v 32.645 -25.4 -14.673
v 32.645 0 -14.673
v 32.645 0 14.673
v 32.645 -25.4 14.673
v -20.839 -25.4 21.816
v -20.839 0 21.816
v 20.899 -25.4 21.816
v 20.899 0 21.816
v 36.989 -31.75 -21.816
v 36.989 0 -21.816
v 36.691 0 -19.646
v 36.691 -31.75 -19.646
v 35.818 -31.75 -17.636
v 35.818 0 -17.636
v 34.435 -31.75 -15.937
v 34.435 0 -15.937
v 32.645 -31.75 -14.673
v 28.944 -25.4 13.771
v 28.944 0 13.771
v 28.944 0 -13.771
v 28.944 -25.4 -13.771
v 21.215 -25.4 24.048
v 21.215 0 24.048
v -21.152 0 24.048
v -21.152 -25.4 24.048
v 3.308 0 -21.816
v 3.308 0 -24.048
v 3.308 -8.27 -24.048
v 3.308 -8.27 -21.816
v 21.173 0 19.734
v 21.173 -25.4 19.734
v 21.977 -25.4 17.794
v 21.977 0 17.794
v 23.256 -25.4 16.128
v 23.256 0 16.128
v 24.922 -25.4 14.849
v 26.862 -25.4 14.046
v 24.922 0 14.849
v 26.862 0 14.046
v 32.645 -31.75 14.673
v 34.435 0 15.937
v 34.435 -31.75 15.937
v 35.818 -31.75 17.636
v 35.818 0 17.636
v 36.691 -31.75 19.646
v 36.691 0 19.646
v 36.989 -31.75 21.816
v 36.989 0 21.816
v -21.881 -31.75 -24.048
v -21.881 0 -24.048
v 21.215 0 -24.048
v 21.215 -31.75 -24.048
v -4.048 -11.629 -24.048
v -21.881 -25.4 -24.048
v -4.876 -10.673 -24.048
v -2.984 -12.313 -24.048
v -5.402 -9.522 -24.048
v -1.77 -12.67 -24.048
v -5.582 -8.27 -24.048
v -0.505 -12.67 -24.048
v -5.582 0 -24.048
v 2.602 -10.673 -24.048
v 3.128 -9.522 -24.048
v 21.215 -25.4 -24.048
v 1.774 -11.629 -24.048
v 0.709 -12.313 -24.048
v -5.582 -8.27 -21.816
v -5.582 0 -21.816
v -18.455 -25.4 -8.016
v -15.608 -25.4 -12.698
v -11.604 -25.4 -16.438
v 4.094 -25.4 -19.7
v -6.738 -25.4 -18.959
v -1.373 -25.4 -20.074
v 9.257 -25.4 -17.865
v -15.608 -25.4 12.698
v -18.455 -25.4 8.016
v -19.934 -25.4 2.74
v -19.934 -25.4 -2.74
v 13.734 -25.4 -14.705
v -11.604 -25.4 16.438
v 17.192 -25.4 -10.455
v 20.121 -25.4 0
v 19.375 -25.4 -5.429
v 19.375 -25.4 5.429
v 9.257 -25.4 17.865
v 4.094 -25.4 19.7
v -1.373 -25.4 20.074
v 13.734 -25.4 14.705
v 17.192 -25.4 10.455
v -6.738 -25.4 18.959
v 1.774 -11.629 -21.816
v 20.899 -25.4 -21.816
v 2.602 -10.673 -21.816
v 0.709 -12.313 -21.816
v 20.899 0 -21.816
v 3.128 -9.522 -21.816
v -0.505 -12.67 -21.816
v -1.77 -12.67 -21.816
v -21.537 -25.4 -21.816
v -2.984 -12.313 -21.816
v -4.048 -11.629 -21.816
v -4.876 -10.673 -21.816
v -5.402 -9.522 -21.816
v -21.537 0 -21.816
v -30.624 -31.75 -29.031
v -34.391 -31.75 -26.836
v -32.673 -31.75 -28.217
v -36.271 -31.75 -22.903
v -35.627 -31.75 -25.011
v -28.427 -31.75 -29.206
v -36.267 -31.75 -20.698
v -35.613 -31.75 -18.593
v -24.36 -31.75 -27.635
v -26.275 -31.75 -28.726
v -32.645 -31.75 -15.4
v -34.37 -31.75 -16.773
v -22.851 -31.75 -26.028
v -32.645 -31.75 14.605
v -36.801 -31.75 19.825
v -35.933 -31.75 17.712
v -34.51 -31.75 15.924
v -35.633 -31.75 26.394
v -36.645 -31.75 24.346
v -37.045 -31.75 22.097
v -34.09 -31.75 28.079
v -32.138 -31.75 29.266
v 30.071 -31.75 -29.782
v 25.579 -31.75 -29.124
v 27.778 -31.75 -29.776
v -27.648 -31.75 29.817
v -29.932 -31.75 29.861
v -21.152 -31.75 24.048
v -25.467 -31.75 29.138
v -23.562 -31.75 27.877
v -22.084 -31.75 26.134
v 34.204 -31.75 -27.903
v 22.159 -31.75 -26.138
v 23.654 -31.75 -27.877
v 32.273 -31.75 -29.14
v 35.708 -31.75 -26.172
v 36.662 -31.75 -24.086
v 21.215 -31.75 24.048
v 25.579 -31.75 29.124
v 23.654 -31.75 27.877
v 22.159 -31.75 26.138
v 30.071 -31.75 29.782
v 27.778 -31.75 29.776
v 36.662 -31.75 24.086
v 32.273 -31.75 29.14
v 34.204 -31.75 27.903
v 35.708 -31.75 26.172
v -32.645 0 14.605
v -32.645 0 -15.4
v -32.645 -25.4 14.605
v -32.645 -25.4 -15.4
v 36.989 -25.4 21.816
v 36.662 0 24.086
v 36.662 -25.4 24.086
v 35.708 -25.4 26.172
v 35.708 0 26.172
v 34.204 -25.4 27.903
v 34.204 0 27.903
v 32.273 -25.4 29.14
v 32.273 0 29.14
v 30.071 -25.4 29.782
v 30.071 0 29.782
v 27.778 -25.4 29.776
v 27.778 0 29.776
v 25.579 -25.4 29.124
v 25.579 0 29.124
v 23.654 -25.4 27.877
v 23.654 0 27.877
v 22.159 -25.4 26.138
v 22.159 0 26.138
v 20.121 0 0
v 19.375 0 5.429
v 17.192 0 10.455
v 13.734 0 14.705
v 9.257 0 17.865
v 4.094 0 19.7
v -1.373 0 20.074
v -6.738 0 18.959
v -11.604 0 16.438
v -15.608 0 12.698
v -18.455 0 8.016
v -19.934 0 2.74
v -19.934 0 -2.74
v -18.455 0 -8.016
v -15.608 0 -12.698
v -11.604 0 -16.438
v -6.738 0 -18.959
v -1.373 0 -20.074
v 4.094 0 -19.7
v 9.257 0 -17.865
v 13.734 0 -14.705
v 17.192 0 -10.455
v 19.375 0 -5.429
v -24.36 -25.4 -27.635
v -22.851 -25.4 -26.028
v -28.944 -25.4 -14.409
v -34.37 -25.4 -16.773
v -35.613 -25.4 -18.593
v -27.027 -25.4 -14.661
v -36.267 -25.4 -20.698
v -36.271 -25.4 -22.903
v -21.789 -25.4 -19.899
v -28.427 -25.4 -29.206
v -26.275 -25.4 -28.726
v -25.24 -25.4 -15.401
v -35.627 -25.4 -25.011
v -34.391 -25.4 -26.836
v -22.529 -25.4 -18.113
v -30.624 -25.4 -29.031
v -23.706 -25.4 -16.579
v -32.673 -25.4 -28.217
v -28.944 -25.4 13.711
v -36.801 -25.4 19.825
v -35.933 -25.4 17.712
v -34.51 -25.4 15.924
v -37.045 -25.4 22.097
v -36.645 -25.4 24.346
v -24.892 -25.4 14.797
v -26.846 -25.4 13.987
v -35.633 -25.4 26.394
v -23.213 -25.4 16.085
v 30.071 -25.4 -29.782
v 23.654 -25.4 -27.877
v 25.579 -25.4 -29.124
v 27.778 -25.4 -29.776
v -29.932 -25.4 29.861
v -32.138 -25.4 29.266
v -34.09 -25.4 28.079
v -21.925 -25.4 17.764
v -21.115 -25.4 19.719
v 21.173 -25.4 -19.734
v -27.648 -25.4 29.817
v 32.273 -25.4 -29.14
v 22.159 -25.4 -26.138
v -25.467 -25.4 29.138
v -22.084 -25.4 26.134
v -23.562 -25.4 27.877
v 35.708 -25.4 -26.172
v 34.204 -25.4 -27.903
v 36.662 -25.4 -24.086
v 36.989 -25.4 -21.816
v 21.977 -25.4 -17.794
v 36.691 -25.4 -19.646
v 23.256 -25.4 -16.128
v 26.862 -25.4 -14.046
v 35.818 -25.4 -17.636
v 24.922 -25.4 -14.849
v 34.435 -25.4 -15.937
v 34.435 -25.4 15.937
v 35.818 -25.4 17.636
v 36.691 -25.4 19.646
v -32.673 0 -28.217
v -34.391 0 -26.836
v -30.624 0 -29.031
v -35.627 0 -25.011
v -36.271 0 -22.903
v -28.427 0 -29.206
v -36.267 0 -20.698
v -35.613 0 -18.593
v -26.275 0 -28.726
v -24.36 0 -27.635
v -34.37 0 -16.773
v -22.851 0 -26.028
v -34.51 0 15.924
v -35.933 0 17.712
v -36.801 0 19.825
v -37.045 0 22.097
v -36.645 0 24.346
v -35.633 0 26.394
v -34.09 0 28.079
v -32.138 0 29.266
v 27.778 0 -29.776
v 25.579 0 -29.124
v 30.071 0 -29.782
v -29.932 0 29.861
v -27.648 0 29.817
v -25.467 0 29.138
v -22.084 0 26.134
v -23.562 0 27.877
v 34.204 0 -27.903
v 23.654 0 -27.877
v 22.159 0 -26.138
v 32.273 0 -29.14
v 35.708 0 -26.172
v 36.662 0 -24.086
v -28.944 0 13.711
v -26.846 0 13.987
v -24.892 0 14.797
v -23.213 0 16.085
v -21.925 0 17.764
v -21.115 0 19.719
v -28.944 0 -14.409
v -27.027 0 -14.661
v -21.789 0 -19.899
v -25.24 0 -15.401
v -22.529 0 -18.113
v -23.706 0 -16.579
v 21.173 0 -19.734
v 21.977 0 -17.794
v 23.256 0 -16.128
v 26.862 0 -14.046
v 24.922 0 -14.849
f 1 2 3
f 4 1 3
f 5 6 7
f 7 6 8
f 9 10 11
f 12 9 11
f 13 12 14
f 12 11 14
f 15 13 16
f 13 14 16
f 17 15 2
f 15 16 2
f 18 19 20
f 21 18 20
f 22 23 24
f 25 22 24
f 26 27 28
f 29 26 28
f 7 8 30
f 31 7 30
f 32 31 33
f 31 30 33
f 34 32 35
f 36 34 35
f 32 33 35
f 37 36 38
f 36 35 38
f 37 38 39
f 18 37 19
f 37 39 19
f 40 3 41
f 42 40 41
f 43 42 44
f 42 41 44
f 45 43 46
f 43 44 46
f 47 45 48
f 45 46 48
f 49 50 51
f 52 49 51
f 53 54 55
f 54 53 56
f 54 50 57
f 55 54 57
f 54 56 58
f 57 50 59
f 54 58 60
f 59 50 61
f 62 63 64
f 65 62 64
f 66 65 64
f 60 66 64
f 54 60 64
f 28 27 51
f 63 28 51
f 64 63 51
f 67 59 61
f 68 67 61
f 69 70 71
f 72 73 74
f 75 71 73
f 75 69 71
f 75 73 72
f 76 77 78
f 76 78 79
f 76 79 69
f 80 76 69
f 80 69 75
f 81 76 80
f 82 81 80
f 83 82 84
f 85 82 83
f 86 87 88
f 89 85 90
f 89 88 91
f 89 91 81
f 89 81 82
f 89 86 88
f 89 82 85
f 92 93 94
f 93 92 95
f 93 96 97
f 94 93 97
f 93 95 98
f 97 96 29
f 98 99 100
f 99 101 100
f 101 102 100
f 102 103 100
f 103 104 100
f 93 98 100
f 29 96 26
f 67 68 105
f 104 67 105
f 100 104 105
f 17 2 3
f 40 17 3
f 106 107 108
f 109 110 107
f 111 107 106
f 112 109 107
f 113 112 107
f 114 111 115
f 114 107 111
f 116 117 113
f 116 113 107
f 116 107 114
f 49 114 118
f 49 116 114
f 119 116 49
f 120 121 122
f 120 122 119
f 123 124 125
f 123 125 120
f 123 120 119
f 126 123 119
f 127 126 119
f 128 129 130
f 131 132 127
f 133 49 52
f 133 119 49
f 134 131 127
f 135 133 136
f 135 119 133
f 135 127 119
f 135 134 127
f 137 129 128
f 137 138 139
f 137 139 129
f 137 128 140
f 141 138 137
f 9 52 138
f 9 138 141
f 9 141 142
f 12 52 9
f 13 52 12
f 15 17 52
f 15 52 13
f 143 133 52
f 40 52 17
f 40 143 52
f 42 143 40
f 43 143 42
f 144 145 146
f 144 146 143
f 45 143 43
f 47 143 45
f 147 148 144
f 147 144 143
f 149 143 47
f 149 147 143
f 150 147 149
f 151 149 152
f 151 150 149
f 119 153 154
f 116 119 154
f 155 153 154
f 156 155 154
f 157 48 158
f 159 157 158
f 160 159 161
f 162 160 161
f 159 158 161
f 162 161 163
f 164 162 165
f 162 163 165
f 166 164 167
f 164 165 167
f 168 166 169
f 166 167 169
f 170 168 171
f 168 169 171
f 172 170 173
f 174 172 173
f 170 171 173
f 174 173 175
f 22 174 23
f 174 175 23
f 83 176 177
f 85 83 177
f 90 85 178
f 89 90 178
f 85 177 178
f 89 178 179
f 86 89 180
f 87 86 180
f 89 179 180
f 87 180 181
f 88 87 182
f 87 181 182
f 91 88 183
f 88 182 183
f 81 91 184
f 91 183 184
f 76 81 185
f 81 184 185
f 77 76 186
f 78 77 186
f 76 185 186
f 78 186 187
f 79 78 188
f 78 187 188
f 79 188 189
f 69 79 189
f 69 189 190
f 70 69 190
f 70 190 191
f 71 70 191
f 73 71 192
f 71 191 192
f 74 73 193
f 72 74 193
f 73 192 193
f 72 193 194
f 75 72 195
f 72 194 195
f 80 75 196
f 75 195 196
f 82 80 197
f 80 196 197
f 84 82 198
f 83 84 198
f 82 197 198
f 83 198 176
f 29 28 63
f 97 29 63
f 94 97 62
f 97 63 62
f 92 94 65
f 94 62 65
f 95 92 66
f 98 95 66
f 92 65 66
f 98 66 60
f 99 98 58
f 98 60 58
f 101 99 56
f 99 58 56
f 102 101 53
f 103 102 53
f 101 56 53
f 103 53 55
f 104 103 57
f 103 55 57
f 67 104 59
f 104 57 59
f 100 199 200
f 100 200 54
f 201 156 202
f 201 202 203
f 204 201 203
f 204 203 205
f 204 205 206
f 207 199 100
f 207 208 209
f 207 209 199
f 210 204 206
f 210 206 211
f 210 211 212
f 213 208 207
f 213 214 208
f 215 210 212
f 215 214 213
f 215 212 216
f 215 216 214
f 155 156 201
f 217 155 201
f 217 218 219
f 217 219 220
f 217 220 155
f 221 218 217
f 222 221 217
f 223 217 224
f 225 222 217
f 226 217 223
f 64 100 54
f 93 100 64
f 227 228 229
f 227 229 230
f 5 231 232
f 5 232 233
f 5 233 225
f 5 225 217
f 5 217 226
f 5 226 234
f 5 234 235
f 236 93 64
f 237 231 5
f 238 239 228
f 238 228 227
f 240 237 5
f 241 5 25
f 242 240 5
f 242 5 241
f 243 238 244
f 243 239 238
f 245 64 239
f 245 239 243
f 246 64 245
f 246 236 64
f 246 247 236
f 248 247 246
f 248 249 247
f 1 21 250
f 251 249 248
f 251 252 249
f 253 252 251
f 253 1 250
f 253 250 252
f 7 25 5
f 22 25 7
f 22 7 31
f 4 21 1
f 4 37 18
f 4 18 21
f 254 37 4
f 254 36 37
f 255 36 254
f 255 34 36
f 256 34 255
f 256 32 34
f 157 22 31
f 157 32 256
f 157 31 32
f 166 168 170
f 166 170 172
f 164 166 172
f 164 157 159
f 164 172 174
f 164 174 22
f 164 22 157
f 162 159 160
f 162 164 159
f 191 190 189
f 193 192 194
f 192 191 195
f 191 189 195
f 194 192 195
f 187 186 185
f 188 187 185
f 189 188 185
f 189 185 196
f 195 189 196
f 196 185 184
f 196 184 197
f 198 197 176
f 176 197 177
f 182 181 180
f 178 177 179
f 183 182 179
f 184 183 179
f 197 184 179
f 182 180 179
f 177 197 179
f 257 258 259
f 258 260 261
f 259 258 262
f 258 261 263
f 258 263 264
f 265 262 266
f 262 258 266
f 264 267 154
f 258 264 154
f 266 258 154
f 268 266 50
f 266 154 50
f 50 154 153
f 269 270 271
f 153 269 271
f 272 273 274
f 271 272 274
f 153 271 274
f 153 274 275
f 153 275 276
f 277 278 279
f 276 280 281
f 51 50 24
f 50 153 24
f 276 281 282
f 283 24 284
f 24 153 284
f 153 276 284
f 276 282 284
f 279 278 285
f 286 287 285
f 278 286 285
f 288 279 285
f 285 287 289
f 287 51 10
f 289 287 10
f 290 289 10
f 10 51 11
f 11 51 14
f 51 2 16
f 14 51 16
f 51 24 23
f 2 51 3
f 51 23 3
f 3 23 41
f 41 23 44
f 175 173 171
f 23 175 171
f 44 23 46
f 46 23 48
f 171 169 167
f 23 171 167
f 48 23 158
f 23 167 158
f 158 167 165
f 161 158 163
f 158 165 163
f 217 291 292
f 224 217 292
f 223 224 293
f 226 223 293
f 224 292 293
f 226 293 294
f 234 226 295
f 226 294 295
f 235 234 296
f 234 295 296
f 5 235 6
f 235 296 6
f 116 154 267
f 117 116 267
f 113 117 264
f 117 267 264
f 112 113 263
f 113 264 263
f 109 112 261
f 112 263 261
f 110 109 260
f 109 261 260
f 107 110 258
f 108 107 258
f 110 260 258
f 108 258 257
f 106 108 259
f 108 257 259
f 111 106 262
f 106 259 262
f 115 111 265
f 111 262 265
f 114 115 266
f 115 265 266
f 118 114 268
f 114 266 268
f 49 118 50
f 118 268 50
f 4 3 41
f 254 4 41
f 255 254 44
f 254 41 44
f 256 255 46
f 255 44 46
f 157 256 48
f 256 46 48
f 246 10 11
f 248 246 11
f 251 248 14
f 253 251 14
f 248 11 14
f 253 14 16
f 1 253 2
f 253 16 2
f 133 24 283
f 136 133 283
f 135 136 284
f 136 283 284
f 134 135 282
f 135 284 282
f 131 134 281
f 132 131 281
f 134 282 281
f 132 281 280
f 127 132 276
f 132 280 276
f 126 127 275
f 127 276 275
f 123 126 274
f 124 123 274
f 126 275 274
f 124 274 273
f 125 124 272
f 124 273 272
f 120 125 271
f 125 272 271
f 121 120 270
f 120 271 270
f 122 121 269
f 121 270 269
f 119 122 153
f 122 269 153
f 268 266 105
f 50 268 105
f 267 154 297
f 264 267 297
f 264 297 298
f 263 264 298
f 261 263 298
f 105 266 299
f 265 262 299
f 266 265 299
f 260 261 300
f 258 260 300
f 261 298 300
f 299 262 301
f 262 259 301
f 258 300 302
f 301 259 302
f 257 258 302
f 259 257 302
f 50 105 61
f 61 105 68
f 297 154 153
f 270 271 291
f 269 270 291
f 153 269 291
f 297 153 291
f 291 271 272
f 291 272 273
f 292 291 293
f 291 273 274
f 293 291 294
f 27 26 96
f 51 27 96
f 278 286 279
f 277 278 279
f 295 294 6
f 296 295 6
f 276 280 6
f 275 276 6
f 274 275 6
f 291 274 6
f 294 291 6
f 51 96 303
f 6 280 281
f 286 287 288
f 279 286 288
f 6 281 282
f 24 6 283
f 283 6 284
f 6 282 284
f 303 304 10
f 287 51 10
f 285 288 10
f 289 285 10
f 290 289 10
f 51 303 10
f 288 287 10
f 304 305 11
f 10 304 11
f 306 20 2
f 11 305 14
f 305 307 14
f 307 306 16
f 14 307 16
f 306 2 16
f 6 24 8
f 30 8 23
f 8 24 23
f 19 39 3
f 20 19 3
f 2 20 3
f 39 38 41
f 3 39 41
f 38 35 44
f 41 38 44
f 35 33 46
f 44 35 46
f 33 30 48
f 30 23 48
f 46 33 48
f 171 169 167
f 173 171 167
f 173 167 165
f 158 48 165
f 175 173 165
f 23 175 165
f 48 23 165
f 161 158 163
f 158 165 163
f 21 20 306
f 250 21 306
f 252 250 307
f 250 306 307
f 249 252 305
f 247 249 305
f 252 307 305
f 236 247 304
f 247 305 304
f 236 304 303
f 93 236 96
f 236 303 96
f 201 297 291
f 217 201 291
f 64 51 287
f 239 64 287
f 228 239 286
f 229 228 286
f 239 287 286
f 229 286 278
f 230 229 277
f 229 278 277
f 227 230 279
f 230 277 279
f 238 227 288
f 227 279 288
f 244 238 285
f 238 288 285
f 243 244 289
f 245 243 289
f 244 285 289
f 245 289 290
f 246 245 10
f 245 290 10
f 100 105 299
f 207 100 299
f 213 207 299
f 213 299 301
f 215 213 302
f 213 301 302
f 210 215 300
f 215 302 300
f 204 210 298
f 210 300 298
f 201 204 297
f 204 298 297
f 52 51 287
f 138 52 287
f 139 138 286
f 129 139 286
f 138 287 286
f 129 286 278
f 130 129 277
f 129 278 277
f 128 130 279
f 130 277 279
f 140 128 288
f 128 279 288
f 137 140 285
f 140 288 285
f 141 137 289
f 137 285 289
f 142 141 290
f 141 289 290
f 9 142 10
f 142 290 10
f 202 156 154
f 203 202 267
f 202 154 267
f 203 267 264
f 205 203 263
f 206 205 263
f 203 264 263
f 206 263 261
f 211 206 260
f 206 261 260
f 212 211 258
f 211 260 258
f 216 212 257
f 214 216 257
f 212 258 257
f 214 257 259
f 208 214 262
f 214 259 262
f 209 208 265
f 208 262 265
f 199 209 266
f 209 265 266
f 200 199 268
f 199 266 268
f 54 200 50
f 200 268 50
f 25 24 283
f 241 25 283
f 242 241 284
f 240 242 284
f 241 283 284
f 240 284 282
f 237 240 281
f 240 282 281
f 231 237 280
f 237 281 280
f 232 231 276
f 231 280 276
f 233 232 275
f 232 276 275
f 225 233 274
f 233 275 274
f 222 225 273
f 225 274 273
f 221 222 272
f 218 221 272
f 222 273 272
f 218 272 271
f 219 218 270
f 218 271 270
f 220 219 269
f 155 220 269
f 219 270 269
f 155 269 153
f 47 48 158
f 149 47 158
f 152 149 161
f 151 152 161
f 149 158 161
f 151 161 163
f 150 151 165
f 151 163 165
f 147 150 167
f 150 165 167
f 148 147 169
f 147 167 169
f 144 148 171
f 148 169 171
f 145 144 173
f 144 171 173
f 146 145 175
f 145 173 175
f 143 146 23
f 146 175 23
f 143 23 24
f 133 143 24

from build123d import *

# Parameters (mm, degrees)
F0_R     = 20.1212122489
F1_DEPTH = 31.75
F2_DEPTH = 25.4
F4_DEPTH = 25.4


with BuildPart() as f1:
    # F0 (on Front) → F1 (new body)
    with BuildSketch(Plane.XZ):
        with BuildLine():
            ThreePointArc((28.9441868663, 13.7714213436), (23.2555589405, 16.1277281818), (20.8992521023, 21.8163561076))
            Line((20.8992521023, 21.8163561076), (-20.8388379964, 21.8163561076))
            ThreePointArc((-20.8388379964, 21.8163561076), (-23.2128397165, 16.0850089578), (-28.9441868663, 13.7110072377))
            Line((-28.9441868663, 13.7110072377), (-28.9441868663, -14.408954399))
            ThreePointArc((-28.9441868663, -14.408954399), (-23.7063628872, -16.5785321285), (-21.5367851577, -21.8163561076))
            Line((-21.5367851577, -21.8163561076), (20.8992521023, -21.8163561076))
            ThreePointArc((20.8992521023, -21.8163561076), (23.2555589405, -16.1277281818), (28.9441868663, -13.7714213436))
            Line((28.9441868663, -13.7714213436), (28.9441868663, 13.7714213436))
        make_face()
        Circle(F0_R, mode=Mode.SUBTRACT)
        Circle(F0_R)
        with BuildLine():
            ThreePointArc((-28.9441868663, 13.7110072377), (-23.2128397165, 16.0850089578), (-20.8388379964, 21.8163561076))
            ThreePointArc((-20.8388379964, 21.8163561076), (-20.9175451076, 22.9431668192), (-21.1521378679, 24.0480937064))
            ThreePointArc((-21.1521378679, 24.0480937064), (-34.0896867071, 28.0789842852), (-32.6450914145, 14.6052545393))
            ThreePointArc((-32.6450914145, 14.6052545393), (-30.8478919847, 13.9377402949), (-28.9441868663, 13.7110072377))
        make_face()
        with BuildLine():
            ThreePointArc((21.2150004507, 24.0480937064), (20.9785803028, 22.9433376657), (20.8992521023, 21.8163561076))
            ThreePointArc((20.8992521023, 21.8163561076), (23.2555589405, 16.1277281818), (28.9441868663, 13.7714213436))
            ThreePointArc((28.9441868663, 13.7714213436), (30.8487832476, 14.0001237684), (32.6450914145, 14.6732278796))
            ThreePointArc((32.6450914145, 14.6732278796), (35.8178507733, 17.6361982339), (36.9891216302, 21.8163561076))
            ThreePointArc((36.9891216302, 21.8163561076), (30.0711684244, 29.7819626711), (21.2150004507, 24.0480937064))
        make_face()
        with BuildLine():
            ThreePointArc((32.6450914145, -14.6732278796), (30.8487832476, -14.0001237684), (28.9441868663, -13.7714213436))
            ThreePointArc((28.9441868663, -13.7714213436), (23.2555589405, -16.1277281818), (20.8992521023, -21.8163561076))
            ThreePointArc((20.8992521023, -21.8163561076), (20.9785803028, -22.9433376657), (21.2150004507, -24.0480937064))
            ThreePointArc((21.2150004507, -24.0480937064), (30.0711684244, -29.7819626711), (36.9891216302, -21.8163561076))
            ThreePointArc((36.9891216302, -21.8163561076), (35.8178507733, -17.6361982339), (32.6450914145, -14.6732278796))
        make_face()
        with BuildLine():
            ThreePointArc((-21.5367851577, -21.8163561076), (-23.7063628872, -16.5785321285), (-28.9441868663, -14.408954399))
            ThreePointArc((-28.9441868663, -14.408954399), (-30.8598042167, -14.6609378641), (-32.6450914145, -15.3997444162))
            ThreePointArc((-32.6450914145, -15.3997444162), (-33.5836655288, -27.5908550306), (-21.8809760268, -24.0480937064))
            ThreePointArc((-21.8809760268, -24.0480937064), (-21.6233385509, -22.9454176719), (-21.5367851577, -21.8163561076))
        make_face()
        with BuildLine():
            Line((-28.9441868663, -14.408954399), (-28.9441868663, 13.7110072377))
            ThreePointArc((-28.9441868663, 13.7110072377), (-30.8478919847, 13.9377402949), (-32.6450914145, 14.6052545393))
            Line((-32.6450914145, 14.6052545393), (-32.6450914145, -15.3997444162))
            ThreePointArc((-32.6450914145, -15.3997444162), (-30.8598042167, -14.6609378641), (-28.9441868663, -14.408954399))
        make_face()
        with BuildLine():
            ThreePointArc((32.6450914145, 14.6732278796), (30.8487832476, 14.0001237684), (28.9441868663, 13.7714213436))
            Line((28.9441868663, 13.7714213436), (28.9441868663, -13.7714213436))
            ThreePointArc((28.9441868663, -13.7714213436), (30.8487832476, -14.0001237684), (32.6450914145, -14.6732278796))
            Line((32.6450914145, -14.6732278796), (32.6450914145, 14.6732278796))
        make_face()
        with BuildLine():
            ThreePointArc((21.2150004507, -24.0480937064), (20.9785803028, -22.9433376657), (20.8992521023, -21.8163561076))
            Line((20.8992521023, -21.8163561076), (-21.5367851577, -21.8163561076))
            ThreePointArc((-21.5367851577, -21.8163561076), (-21.6233385509, -22.9454176719), (-21.8809760268, -24.0480937064))
            Line((-21.8809760268, -24.0480937064), (21.2150004507, -24.0480937064))
        make_face()
        with BuildLine():
            Line((-20.8388379964, 21.8163561076), (20.8992521023, 21.8163561076))
            ThreePointArc((20.8992521023, 21.8163561076), (20.9785803028, 22.9433376657), (21.2150004507, 24.0480937064))
            Line((21.2150004507, 24.0480937064), (-21.1521378679, 24.0480937064))
            ThreePointArc((-21.1521378679, 24.0480937064), (-20.9175451076, 22.9431668192), (-20.8388379964, 21.8163561076))
        make_face()
    extrude(amount=F1_DEPTH)


with BuildPart() as f2:
    # F0 (on Front) → F2 (new body)
    with BuildSketch(Plane.XZ):
        with BuildLine():
            Line((-20.8388379964, 21.8163561076), (20.8992521023, 21.8163561076))
            ThreePointArc((20.8992521023, 21.8163561076), (20.9785803028, 22.9433376657), (21.2150004507, 24.0480937064))
            Line((21.2150004507, 24.0480937064), (-21.1521378679, 24.0480937064))
            ThreePointArc((-21.1521378679, 24.0480937064), (-20.9175451076, 22.9431668192), (-20.8388379964, 21.8163561076))
        make_face()
        with BuildLine():
            ThreePointArc((21.2150004507, 24.0480937064), (20.9785803028, 22.9433376657), (20.8992521023, 21.8163561076))
            ThreePointArc((20.8992521023, 21.8163561076), (23.2555589405, 16.1277281818), (28.9441868663, 13.7714213436))
            ThreePointArc((28.9441868663, 13.7714213436), (30.8487832476, 14.0001237684), (32.6450914145, 14.6732278796))
            ThreePointArc((32.6450914145, 14.6732278796), (35.8178507733, 17.6361982339), (36.9891216302, 21.8163561076))
            ThreePointArc((36.9891216302, 21.8163561076), (30.0711684244, 29.7819626711), (21.2150004507, 24.0480937064))
        make_face()
        with BuildLine():
            ThreePointArc((-28.9441868663, 13.7110072377), (-23.2128397165, 16.0850089578), (-20.8388379964, 21.8163561076))
            ThreePointArc((-20.8388379964, 21.8163561076), (-20.9175451076, 22.9431668192), (-21.1521378679, 24.0480937064))
            ThreePointArc((-21.1521378679, 24.0480937064), (-34.0896867071, 28.0789842852), (-32.6450914145, 14.6052545393))
            ThreePointArc((-32.6450914145, 14.6052545393), (-30.8478919847, 13.9377402949), (-28.9441868663, 13.7110072377))
        make_face()
        with BuildLine():
            ThreePointArc((32.6450914145, 14.6732278796), (30.8487832476, 14.0001237684), (28.9441868663, 13.7714213436))
            Line((28.9441868663, 13.7714213436), (28.9441868663, -13.7714213436))
            ThreePointArc((28.9441868663, -13.7714213436), (30.8487832476, -14.0001237684), (32.6450914145, -14.6732278796))
            Line((32.6450914145, -14.6732278796), (32.6450914145, 14.6732278796))
        make_face()
        with BuildLine():
            Line((-28.9441868663, -14.408954399), (-28.9441868663, 13.7110072377))
            ThreePointArc((-28.9441868663, 13.7110072377), (-30.8478919847, 13.9377402949), (-32.6450914145, 14.6052545393))
            Line((-32.6450914145, 14.6052545393), (-32.6450914145, -15.3997444162))
            ThreePointArc((-32.6450914145, -15.3997444162), (-30.8598042167, -14.6609378641), (-28.9441868663, -14.408954399))
        make_face()
        with BuildLine():
            ThreePointArc((32.6450914145, -14.6732278796), (30.8487832476, -14.0001237684), (28.9441868663, -13.7714213436))
            ThreePointArc((28.9441868663, -13.7714213436), (23.2555589405, -16.1277281818), (20.8992521023, -21.8163561076))
            ThreePointArc((20.8992521023, -21.8163561076), (20.9785803028, -22.9433376657), (21.2150004507, -24.0480937064))
            ThreePointArc((21.2150004507, -24.0480937064), (30.0711684244, -29.7819626711), (36.9891216302, -21.8163561076))
            ThreePointArc((36.9891216302, -21.8163561076), (35.8178507733, -17.6361982339), (32.6450914145, -14.6732278796))
        make_face()
        with BuildLine():
            ThreePointArc((-21.5367851577, -21.8163561076), (-23.7063628872, -16.5785321285), (-28.9441868663, -14.408954399))
            ThreePointArc((-28.9441868663, -14.408954399), (-30.8598042167, -14.6609378641), (-32.6450914145, -15.3997444162))
            ThreePointArc((-32.6450914145, -15.3997444162), (-33.5836655288, -27.5908550306), (-21.8809760268, -24.0480937064))
            ThreePointArc((-21.8809760268, -24.0480937064), (-21.6233385509, -22.9454176719), (-21.5367851577, -21.8163561076))
        make_face()
        with BuildLine():
            ThreePointArc((21.2150004507, -24.0480937064), (20.9785803028, -22.9433376657), (20.8992521023, -21.8163561076))
            Line((20.8992521023, -21.8163561076), (-21.5367851577, -21.8163561076))
            ThreePointArc((-21.5367851577, -21.8163561076), (-21.6233385509, -22.9454176719), (-21.8809760268, -24.0480937064))
            Line((-21.8809760268, -24.0480937064), (21.2150004507, -24.0480937064))
        make_face()
    extrude(amount=F2_DEPTH)

    # F3 (on face) → F4 (cut)
    with BuildSketch(Plane(origin=(0, 0, -24.0480937064), x_dir=(1, 0, 0), z_dir=(0, 0, -1))):
        with BuildLine():
            Line((-5.5820932612, 8.2697672769), (-5.5820932612, 0))
            Line((-5.5820932612, 0), (3.3079062123, 0))
            Line((3.3079062123, 0), (3.3079062123, 8.2697672769))
            ThreePointArc((3.3079062123, 8.2697672769), (-1.1370935244, 12.7147670137), (-5.5820932612, 8.2697672769))
        make_face()
    extrude(amount=-F4_DEPTH, mode=Mode.SUBTRACT)


with BuildPart() as f2b:
    # F0 (on Front) → F2, piece 2 (new body)
    with BuildSketch(Plane.XZ):
        Circle(F0_R)
    extrude(amount=F2_DEPTH)


solid = Compound([f1.part, f2.part, f2b.part])
